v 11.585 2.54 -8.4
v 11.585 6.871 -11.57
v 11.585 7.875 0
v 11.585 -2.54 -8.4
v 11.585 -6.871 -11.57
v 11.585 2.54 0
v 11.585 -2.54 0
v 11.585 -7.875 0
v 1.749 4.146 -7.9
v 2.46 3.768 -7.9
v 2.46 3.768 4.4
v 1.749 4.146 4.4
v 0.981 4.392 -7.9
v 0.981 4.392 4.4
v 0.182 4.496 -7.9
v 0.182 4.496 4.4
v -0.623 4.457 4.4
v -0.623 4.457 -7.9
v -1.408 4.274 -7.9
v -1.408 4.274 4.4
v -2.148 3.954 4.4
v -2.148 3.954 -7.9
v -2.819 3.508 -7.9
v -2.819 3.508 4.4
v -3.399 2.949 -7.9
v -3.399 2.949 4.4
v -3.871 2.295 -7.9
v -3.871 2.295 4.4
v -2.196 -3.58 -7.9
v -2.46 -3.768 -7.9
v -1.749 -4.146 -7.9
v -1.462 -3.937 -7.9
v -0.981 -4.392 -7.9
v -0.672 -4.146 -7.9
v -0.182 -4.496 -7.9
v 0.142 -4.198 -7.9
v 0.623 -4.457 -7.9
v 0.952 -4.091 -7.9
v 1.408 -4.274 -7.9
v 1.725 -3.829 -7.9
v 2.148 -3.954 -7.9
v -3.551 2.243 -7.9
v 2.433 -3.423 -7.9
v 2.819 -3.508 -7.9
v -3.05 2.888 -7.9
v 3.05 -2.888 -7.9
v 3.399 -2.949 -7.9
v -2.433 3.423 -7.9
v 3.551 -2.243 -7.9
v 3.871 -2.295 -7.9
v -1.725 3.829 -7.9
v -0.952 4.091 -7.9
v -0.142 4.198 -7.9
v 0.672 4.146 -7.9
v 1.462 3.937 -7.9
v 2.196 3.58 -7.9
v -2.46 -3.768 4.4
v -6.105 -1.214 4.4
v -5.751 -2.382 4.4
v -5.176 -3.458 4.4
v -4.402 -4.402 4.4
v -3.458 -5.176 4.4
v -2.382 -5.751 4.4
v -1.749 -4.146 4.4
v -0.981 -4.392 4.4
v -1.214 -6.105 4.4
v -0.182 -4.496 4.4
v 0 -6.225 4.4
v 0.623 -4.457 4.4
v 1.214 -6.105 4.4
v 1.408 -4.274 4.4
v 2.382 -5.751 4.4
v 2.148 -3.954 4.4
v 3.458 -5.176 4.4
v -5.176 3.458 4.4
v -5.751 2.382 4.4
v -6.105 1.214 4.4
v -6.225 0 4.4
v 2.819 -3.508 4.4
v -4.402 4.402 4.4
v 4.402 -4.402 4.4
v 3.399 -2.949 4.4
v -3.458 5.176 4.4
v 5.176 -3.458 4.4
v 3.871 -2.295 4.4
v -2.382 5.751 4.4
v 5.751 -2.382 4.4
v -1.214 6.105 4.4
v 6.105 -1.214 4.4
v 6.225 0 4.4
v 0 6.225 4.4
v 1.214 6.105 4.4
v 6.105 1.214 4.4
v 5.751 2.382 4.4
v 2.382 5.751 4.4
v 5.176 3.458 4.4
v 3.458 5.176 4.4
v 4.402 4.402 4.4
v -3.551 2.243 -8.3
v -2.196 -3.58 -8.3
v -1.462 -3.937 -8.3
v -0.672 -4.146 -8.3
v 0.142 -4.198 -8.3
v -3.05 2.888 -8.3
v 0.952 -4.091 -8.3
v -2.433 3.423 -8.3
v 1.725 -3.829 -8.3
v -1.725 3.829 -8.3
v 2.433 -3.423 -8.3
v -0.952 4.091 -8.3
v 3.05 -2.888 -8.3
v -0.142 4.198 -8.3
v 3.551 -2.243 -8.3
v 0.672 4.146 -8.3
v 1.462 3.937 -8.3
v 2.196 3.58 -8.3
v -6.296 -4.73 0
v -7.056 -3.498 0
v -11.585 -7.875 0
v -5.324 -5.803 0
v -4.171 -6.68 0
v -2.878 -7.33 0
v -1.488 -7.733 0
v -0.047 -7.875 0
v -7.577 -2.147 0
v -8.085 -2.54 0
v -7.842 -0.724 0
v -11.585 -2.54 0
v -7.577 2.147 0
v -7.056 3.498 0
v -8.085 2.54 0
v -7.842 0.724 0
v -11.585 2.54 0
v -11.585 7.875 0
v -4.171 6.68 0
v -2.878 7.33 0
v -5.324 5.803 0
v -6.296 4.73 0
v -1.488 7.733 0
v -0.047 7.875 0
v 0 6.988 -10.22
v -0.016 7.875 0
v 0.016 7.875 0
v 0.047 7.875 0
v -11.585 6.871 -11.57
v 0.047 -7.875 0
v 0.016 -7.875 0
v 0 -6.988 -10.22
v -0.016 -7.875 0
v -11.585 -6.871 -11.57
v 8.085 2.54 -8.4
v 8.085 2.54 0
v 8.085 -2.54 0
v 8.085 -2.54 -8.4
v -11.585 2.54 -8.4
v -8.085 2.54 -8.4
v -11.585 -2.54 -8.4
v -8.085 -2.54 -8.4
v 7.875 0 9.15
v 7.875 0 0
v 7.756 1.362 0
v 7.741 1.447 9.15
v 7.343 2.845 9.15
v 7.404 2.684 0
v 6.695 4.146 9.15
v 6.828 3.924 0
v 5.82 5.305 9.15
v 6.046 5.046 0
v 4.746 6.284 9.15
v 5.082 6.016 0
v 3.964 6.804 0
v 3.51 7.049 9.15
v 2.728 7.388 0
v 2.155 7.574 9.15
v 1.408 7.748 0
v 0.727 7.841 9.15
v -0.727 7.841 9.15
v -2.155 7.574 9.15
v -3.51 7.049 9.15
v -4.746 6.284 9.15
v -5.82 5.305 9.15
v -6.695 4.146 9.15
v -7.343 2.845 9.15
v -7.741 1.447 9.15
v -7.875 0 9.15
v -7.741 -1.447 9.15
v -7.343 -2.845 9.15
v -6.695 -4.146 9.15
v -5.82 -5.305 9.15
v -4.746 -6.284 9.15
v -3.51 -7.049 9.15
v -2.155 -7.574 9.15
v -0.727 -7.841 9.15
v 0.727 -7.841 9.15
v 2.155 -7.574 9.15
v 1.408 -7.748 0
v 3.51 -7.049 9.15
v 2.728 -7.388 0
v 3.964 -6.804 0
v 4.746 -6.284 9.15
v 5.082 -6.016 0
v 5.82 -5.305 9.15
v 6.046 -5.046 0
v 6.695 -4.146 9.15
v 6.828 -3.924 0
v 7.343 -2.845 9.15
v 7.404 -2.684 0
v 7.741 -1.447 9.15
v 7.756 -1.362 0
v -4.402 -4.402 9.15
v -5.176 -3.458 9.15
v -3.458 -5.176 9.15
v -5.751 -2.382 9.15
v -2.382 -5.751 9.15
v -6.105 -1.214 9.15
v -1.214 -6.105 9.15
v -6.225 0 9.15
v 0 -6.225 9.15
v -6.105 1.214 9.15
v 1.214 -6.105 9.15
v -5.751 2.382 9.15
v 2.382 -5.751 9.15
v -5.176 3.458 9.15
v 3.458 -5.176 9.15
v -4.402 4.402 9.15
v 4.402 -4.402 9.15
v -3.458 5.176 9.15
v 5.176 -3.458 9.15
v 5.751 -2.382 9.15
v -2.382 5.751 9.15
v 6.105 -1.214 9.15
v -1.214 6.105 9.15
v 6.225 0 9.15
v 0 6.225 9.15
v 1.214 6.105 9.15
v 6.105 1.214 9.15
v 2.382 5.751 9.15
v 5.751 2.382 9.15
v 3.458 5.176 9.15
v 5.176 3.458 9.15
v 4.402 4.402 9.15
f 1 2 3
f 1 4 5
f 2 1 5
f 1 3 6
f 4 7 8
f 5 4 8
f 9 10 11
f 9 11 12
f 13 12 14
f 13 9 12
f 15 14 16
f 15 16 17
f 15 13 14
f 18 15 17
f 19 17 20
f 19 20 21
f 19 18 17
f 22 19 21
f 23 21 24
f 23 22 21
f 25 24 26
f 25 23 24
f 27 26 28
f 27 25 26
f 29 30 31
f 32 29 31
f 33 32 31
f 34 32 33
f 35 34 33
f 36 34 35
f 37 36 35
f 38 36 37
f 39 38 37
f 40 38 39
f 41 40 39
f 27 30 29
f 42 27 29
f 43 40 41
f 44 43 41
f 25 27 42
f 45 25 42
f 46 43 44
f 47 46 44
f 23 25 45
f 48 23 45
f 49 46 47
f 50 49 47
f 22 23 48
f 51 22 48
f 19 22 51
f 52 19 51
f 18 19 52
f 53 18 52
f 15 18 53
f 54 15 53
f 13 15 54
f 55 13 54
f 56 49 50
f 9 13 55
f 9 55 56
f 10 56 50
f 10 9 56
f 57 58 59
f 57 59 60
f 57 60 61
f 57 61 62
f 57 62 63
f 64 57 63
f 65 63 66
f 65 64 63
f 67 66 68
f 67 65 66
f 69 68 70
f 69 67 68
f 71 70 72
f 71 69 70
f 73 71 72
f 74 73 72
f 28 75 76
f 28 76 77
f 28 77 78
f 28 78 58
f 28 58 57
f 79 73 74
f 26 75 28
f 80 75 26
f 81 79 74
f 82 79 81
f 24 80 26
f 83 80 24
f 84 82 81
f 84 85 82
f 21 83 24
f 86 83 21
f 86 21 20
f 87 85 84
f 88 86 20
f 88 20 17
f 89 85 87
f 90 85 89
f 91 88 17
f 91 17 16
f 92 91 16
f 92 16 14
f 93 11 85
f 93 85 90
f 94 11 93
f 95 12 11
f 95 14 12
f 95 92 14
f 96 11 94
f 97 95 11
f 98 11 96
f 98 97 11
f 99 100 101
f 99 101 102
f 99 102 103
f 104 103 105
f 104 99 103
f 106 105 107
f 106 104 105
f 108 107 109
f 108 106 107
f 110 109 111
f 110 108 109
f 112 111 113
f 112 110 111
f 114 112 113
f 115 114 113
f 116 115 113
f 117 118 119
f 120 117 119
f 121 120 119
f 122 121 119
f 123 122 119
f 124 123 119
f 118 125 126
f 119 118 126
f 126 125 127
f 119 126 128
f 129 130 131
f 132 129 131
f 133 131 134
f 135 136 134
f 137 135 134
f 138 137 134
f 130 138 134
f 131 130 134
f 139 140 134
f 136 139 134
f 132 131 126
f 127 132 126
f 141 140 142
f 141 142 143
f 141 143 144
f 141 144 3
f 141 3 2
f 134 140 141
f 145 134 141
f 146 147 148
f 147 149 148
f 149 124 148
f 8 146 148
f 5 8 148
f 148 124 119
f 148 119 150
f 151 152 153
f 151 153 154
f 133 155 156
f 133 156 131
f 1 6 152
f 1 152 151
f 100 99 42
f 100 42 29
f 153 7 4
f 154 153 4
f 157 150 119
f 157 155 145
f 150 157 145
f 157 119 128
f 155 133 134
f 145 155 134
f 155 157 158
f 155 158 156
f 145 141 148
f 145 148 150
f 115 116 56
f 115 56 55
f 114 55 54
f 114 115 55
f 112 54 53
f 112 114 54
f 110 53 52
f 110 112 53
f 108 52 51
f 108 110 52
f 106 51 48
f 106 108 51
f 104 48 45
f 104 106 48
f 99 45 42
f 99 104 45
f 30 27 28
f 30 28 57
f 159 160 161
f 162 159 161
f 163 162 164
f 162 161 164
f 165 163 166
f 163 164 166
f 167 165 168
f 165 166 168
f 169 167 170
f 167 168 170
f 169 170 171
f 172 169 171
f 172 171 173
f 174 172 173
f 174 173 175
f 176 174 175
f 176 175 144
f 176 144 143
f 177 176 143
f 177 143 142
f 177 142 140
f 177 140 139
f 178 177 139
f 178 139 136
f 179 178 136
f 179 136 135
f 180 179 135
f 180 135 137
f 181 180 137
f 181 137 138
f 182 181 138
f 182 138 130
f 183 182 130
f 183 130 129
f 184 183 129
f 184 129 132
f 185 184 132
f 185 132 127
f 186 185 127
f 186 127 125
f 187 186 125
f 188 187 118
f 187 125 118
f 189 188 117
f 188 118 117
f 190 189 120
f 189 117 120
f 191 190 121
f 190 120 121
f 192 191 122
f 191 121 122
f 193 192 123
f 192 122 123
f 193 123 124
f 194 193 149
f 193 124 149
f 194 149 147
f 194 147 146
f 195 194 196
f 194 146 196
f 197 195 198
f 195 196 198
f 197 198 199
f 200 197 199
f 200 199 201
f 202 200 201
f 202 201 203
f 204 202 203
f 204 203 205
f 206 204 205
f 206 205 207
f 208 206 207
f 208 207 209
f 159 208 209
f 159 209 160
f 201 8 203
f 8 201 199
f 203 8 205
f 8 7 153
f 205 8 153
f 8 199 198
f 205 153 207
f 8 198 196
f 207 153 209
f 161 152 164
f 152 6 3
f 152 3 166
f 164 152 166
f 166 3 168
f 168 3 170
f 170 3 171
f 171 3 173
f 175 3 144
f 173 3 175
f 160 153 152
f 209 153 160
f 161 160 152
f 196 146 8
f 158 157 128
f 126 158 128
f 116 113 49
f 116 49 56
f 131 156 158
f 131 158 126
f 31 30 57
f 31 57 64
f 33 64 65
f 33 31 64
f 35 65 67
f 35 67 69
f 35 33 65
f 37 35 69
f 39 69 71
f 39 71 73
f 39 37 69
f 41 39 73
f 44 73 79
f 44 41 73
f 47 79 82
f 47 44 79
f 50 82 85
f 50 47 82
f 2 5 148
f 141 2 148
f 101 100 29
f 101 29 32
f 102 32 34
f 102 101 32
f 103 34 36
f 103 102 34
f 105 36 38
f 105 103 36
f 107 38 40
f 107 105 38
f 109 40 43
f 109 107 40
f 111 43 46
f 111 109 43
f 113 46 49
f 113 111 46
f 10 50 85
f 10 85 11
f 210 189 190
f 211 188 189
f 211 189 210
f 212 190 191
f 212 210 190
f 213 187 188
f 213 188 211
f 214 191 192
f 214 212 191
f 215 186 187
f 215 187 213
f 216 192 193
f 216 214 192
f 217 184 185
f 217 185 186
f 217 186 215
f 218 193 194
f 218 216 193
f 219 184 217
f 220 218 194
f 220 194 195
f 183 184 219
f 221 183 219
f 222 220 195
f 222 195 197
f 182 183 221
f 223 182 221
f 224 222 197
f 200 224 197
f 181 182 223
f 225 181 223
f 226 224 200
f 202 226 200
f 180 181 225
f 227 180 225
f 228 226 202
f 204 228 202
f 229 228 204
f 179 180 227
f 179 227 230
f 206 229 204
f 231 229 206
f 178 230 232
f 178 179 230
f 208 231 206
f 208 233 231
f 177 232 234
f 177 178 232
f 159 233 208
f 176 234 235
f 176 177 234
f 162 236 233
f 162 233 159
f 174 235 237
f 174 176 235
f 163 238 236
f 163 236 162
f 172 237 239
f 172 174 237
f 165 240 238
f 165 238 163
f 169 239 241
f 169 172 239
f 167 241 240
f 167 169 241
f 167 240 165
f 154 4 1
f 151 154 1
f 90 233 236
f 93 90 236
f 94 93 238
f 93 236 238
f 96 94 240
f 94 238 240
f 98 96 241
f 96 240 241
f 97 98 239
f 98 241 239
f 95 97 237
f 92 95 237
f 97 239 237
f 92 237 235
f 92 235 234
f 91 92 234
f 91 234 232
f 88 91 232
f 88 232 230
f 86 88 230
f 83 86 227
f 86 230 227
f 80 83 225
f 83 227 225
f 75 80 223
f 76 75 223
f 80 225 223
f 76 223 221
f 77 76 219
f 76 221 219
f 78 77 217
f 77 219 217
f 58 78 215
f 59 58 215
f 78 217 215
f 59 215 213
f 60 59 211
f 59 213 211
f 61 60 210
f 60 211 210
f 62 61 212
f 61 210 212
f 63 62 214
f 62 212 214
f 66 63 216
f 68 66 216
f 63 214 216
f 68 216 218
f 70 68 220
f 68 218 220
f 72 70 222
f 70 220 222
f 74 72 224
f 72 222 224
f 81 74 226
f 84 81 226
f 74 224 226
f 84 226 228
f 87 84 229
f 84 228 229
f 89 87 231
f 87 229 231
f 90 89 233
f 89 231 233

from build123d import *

# Parameters (mm, degrees)
SKETCH1_R           = 7.875
BOSS_EXTRUDE1_DEPTH = 9.15
BOSS_EXTRUDE4_DEPTH = 11.57
SKETCH12_W          = 8.4
SKETCH12_H          = 5.08
CUT_EXTRUDE36_DEPTH = 3.5
SKETCH13_W          = 8.4
SKETCH13_H          = 5.08
CUT_EXTRUDE37_DEPTH = 3.5
SKETCH14_R          = 6.225
CUT_EXTRUDE38_DEPTH = 4.75
CAVITY1_START       = -7.9
CAVITY1_DEPTH       = 12.3
CAVITY1_START_2     = -8.3
CAVITY1_2_DEPTH     = 0.4
CUT_EXTRUDE40_START = -12.7
CUT_EXTRUDE40_DEPTH = 12.7
CUT_EXTRUDE45_DEPTH = 28.068975322
CUT_EXTRUDE46_DEPTH = 10.5


# Read off the part's stored shape, not the designer's step: Cavity1
with BuildPart() as part:
    # Sketch1 → Boss-Extrude1 (new body)
    with BuildSketch(Plane.XY):
        Circle(SKETCH1_R)
    extrude(amount=BOSS_EXTRUDE1_DEPTH)

    # Sketch2 → Boss-Extrude4 (add)
    with BuildSketch(Plane(origin=(0, 0, 0), x_dir=(-1, 0, 0), z_dir=(0, 0, -1))):
        Polygon((-11.585, 7.874861502), (-11.585, -7.874861502), (0, -7.875), (11.585, -7.874861502), (11.585, 7.874861502), (-9.4146e-05, 7.874999999), align=None)
    extrude(amount=BOSS_EXTRUDE4_DEPTH)

    # Sketch12 → Cut-Extrude36 (cut)
    with BuildSketch(Plane.ZY.offset(11.585)):
        with Locations((-4.2, 0)):
            Rectangle(SKETCH12_W, SKETCH12_H)
    extrude(amount=-CUT_EXTRUDE36_DEPTH, mode=Mode.SUBTRACT)

    # Sketch13 → Cut-Extrude37 (cut)
    with BuildSketch(Plane(origin=(11.585, 0, 0), x_dir=(0, 0, -1), z_dir=(1, 0, 0))):
        with Locations((4.2, 0)):
            Rectangle(SKETCH13_W, SKETCH13_H)
    extrude(amount=-CUT_EXTRUDE37_DEPTH, mode=Mode.SUBTRACT)

    # Sketch14 → Cut-Extrude38 (cut)
    with BuildSketch(Plane.XY.offset(9.15)):
        Circle(SKETCH14_R)
    extrude(amount=-CUT_EXTRUDE38_DEPTH, mode=Mode.SUBTRACT)

    # Cavity1 outline → Cavity1 (cut)
    with BuildSketch(Plane.XY.offset(CAVITY1_START)):
        with BuildLine():
            Line((3.870791195, -2.29498922), (2.460102149, 3.768009742))
            ThreePointArc((2.460102149, 3.768009742), (-1.019783438, 4.382926162), (-3.870791195, 2.29498922))
            Line((-3.870791195, 2.29498922), (-2.460102149, -3.768009742))
            ThreePointArc((-2.460102149, -3.768009742), (1.019783438, -4.382926162), (3.870791195, -2.29498922))
        make_face()
        Polygon((0.567084274, 3.078606085), (1.867874704, -2.51205973), (-0.567084274, -3.078606085), (-1.867874704, 2.51205973), align=None, mode=Mode.SUBTRACT)
    extrude(amount=CAVITY1_DEPTH, mode=Mode.SUBTRACT)

    # Cavity1 2 outline → Cavity1 2 (cut)
    with BuildSketch(Plane.XY.offset(CAVITY1_START_2)):
        with BuildLine():
            ThreePointArc((2.195760692, 3.580312135), (-0.951797876, 4.090731084), (-3.550742498, 2.243262738))
            Line((-3.550742498, 2.243262738), (-2.195760692, -3.580312135))
            ThreePointArc((-2.195760692, -3.580312135), (0.951797876, -4.090731084), (3.550742498, -2.243262738))
            Line((3.550742498, -2.243262738), (2.195760692, 3.580312135))
        make_face()
        Polygon((0.567084274, 3.078606085), (1.867874704, -2.51205973), (-0.567084274, -3.078606085), (-1.867874704, 2.51205973), align=None, mode=Mode.SUBTRACT)
    extrude(amount=CAVITY1_2_DEPTH, mode=Mode.SUBTRACT)

    # Sketch15 → Cut-Extrude40 (cut)
    with BuildSketch(Plane.XY.offset(4.4).offset(CUT_EXTRUDE40_START)):
        Polygon((-1.867874704, 2.51205973), (0.567084274, 3.078606085), (1.867874704, -2.51205973), (-0.567084274, -3.078606085), align=None)
    extrude(amount=CUT_EXTRUDE40_DEPTH, mode=Mode.SUBTRACT)

    # Sketch16 → Cut-Extrude45 (cut, through all)
    with BuildSketch(Plane.ZY.offset(11.585)):
        Polygon((0, 7.874861502), (-11.57, 6.8707), (-11.57, 7.874861502), (-11.57, 8.881300341), (0.174713313, 8.881300341), align=None)
        Polygon((0, -7.874861502), (-11.57, -6.8707), (-11.57, -8.73716659), (0, -8.516935753), align=None)
    extrude(amount=-CUT_EXTRUDE45_DEPTH, mode=Mode.SUBTRACT)

    # Sketch17 → Cut-Extrude46 (cut, symmetric)
    with BuildSketch(Plane(origin=(0, 0, 0), x_dir=(1, 0, 0), z_dir=(0, 1, 0))):
        Polygon((-11.585, 11.57), (11.585, 11.57), (0, 10.22), align=None)
    extrude(amount=CUT_EXTRUDE46_DEPTH, both=True, mode=Mode.SUBTRACT)


solid = part.part
